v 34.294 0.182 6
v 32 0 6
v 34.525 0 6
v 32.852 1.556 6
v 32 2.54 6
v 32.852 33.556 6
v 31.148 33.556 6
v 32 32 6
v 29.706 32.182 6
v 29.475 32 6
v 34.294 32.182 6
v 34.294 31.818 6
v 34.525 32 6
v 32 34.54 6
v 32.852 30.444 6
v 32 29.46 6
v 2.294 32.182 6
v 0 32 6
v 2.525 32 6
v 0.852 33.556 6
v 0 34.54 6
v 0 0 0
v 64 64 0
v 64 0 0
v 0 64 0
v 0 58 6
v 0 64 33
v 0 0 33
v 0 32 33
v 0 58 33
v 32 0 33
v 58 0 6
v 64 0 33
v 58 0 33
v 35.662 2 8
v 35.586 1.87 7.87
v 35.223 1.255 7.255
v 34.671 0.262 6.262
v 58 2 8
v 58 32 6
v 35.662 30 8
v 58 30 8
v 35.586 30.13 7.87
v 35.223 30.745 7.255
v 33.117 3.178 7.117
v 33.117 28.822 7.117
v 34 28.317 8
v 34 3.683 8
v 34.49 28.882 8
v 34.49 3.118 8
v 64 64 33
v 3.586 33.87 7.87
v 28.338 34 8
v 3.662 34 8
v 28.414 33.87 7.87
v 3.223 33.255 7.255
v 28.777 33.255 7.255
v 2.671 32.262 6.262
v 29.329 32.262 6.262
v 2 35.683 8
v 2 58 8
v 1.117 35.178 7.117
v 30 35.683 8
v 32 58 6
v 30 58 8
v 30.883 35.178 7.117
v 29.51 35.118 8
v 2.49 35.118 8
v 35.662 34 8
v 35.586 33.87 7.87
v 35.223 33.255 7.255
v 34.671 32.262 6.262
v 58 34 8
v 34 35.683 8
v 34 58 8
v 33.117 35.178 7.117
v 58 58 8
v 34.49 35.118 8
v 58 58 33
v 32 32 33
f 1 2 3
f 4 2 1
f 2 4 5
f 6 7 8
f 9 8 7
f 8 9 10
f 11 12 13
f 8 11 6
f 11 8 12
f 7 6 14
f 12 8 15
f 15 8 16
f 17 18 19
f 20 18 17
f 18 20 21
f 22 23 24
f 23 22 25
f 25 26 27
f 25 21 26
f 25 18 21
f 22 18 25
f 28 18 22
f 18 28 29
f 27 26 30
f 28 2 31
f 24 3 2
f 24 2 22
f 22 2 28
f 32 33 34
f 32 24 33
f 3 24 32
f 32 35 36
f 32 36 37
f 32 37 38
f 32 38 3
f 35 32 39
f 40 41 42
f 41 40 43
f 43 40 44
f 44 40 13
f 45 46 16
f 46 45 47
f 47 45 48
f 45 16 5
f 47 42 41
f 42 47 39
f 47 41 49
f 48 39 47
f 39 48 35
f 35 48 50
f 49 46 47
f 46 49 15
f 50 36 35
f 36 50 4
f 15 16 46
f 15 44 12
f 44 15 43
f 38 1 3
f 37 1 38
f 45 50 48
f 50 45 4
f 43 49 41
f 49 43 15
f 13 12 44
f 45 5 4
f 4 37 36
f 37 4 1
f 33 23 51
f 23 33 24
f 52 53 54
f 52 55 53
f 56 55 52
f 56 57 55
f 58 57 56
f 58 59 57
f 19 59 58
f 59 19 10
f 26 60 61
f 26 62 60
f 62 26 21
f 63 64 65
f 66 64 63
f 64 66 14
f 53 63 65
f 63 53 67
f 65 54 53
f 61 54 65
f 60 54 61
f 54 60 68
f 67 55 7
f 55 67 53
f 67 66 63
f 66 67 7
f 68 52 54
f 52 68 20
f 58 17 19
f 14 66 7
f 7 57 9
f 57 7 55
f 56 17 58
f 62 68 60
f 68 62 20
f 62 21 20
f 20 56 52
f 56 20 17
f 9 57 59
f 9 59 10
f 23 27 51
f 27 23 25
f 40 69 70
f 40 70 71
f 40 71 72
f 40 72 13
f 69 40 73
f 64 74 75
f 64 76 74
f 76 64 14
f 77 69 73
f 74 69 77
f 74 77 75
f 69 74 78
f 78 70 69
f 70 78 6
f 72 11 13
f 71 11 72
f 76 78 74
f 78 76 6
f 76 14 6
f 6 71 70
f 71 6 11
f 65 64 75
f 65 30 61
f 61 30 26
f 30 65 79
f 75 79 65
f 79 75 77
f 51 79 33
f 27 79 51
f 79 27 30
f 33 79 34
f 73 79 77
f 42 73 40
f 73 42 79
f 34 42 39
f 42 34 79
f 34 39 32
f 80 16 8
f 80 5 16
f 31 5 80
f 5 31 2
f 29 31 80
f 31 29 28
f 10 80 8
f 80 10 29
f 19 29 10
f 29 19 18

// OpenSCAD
// file: WylochStyleDungeonLibrary.scad
size = 32;
baseheight = 6;
topperheight = 2;
topperrounded = true;
walllength = size;
wallheight = 25 + baseheight + topperheight;
wallwidth = 6;
wallwidththin = 4;

function hypotenuse_ra(side_a, side_b) =
    sqrt(pow(side_a, 2) + pow(side_b, 2));
    
module wsdl_Base(s,bh)
{
    cube([s,s,bh]);
}

module wsdl_Topper(s,bh,th,tr)
{
    if (tr) {
        translate([0,0,bh])
            intersection() {
                difference () {
                        cube([s,s,th]);
                        union () {
                        rotate(a=45, v=[1,0,0])
                            cube([s,th*2,th*2]);
                        translate([0,s,0])
                            rotate(a=45, v=[1,0,0])
                                cube([s,th*2,th*2]);
                        rotate(a=-45, v=[0,1,0])
                            cube([th*2,s,th*2]);
                        translate([s,0,0])
                            rotate(a=-45, v=[0,1,0])
                                cube([th*2,s,th*2]);
                        }
                }
                translate([s/2,s/2,0])
                    cylinder(
                        h=th, 
                        r1=hypotenuse_ra(s/2-1.2, s/2-1.2), 
                        r2=hypotenuse_ra(s/2-th-.8, s/2-th-.8), 
                        center=false, 
                        $fa=.1);
            }    
    }
    else {
        translate([0,0,bh])
            difference() {
                cube([s,s,th]);
                union () {
                rotate(a=45, v=[1,0,0])
                    cube([s,th*2,th*2]);
                translate([0,s,0])
                    rotate(a=45, v=[1,0,0])
                        cube([s,th*2,th*2]);
                rotate(a=-45, v=[0,1,0])
                    cube([th*2,s,th*2]);
                translate([s,0,0])
                    rotate(a=-45, v=[0,1,0])
                        cube([th*2,s,th*2]);
                }
            }    
    }
}

module wsdl_Base_1x1(s,bh,th,tr) 
{
    union () {
        wsdl_Base(s,bh);
        wsdl_Topper(s,bh,th,tr);
    }
}

module wsdl_Base_1x2(s,bh,th,tr)
{
    union () {
        wsdl_Base_1x1(s,bh,th,tr);
        translate([s,0,0])
            wsdl_Base_1x1(s,bh,th,tr);
    }
}
 
module wsdl_Base_2x2(s,bh,th,tr)
{
    union () {
        wsdl_Base_1x2(s,bh,th,tr);
        translate([0,s,0])
            wsdl_Base_1x2(s,bh,th,tr);
    }
}
 
module wsdl_Base_2x4(s,bh,th,tr)
{
    union () {
        wsdl_Base_2x2(s,bh,th,tr);
        translate([s*2,0,0])
            wsdl_Base_2x2(s,bh,th,tr);
    }
}
 
module wsdl_Base_4x4(s,bh,th,tr)
{
    union () {
        wsdl_Base_2x4(s,bh,th,tr);
        translate([0,s*2,0])
            wsdl_Base_2x4(s,bh,th,tr);
    }
}
 
module wsdl_Wall_1(w,l,h)
{
    cube([w,l,h]);   
}

module wsdl_Wall_2(w,l,h)
{
    union() {
        wsdl_Wall_1(w,l,h);
        translate([0,l,0])
            wsdl_Wall_1(w,l,h);
    }
}

module wsdl_Wall_1_Left(w,l,h) 
{
    wsdl_Wall_1(w,l,h);
}

module wsdl_Wall_1_Right(w,l,h) 
{
    translate([(size)-w,0,0])
        wsdl_Wall_1(w,l,h);
}

module wsdl_Wall_1_DoubleRight(w,l,h) 
{
    translate([(size*2)-w,0,0])
        wsdl_Wall_1(w,l,h);
}

module wsdl_Wall_1_Bottom(w,l,h) 
{
rotate(a=-90)
    translate([-w,0,0])
        wsdl_Wall_1(w,l,h);

}

module wsdl_Wall_1_Top(w,l,h) 
{
rotate(a=-90)
    translate([-l,0,0])
        wsdl_Wall_1(w,l,h);

}

module wsdl_Wall_1_Center(w,l,h) 
{
    translate([(size)-w/2,0,0])
        wsdl_Wall_1(w,l,h);
}


module wsdl_Wall_2_Left(w,l,h) 
{
    wsdl_Wall_2(w,l,h);
}

module wsdl_Wall_2_Right(w,l,h) 
{
    translate([(size*2)-w,0,0])
        wsdl_Wall_2(w,l,h);
}

module wsdl_Wall_2_Bottom(w,l,h) 
{
rotate(a=-90)
    translate([-w,0,0])
        wsdl_Wall_2(w,l,h);

}

module wsdl_Wall_2_Top(w,l,h) 
{
rotate(a=-90)
    translate([-l*2,0,0])
        wsdl_Wall_2(w,l,h);

}

module wsdl_Wall_2_Center(w,l,h) 
{
    translate([(size)-w/2,0,0])
        wsdl_Wall_2(w,l,h);
}
// main file
include <WylochStyleDungeonLibrary.scad>; 

wsdl_Base_2x2(size,baseheight,topperheight,topperrounded);
wsdl_Wall_2_Top(wallwidth,walllength,wallheight);
wsdl_Wall_2_Right(wallwidth,walllength,wallheight);
//Create Pillar with Modified wall
wsdl_Wall_1_Left(size,size,wallheight);
